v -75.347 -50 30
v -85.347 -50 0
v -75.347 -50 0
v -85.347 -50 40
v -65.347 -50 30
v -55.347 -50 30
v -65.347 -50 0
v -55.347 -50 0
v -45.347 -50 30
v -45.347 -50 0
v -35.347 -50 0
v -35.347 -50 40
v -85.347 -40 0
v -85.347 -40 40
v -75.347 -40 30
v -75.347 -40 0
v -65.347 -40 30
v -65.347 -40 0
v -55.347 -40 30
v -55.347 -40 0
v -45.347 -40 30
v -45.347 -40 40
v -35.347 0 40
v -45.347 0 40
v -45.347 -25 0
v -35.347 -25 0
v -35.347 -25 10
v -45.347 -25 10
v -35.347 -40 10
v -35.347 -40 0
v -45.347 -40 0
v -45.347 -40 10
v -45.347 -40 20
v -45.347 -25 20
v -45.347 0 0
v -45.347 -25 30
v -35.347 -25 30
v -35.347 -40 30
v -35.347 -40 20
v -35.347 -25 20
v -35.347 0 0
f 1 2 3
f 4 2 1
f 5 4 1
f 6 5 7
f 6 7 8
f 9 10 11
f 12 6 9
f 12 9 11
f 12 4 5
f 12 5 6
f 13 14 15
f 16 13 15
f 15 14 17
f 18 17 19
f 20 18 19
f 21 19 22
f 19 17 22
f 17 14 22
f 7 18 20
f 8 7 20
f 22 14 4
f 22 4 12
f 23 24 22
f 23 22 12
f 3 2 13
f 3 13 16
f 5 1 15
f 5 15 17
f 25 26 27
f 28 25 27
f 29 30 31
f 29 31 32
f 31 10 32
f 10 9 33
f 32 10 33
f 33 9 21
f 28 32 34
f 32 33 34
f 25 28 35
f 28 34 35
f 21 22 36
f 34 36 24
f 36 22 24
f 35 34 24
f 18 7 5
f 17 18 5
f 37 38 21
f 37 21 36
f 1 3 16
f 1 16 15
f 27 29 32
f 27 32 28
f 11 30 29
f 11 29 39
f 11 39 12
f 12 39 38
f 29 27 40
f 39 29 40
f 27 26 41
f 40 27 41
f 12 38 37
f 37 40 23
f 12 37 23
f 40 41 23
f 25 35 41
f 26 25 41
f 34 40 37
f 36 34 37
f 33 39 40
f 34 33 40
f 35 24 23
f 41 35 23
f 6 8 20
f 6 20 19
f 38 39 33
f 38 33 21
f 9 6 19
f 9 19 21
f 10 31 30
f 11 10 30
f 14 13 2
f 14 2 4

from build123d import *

# Parameters (mm, degrees)
F0_W     = 50
F0_H     = 40
F1_DEPTH = 50
F2_W     = 40
F2_H     = 40
F3_DEPTH = 50
F4_W     = 10
F4_H     = 30
F5_DEPTH = 10
F6_W     = 15
F6_H     = 10
F7_DEPTH = 10


with BuildPart() as f1:
    # F0 (on Front) → F1 (new body)
    with BuildSketch(Plane.XZ):
        with Locations((-60.347423, 20)):
            Rectangle(F0_W, F0_H)
    extrude(amount=F1_DEPTH)

    # F2 (on face) → F3 (cut)
    with BuildSketch(Plane.XY.offset(40)):
        with Locations((-65.347423, -20)):
            Rectangle(F2_W, F2_H)
    extrude(amount=-F3_DEPTH, mode=Mode.SUBTRACT)

    # F4 (on face) → F5 (cut)
    with BuildSketch(Plane.XZ.offset(50)):
        with Locations((-70.347423, 15)):
            Rectangle(F4_W, F4_H)
        with Locations((-50.347423, 15)):
            Rectangle(F4_W, F4_H)
    extrude(amount=-F5_DEPTH, mode=Mode.SUBTRACT)

    # F6 (on face) → F7 (cut)
    with BuildSketch(Plane.YZ.offset(-35.347423)):
        with Locations((-32.5, 25)):
            Rectangle(F6_W, F6_H)
        with Locations((-32.5, 5)):
            Rectangle(F6_W, F6_H)
    extrude(amount=-F7_DEPTH, mode=Mode.SUBTRACT)


solid = f1.part
